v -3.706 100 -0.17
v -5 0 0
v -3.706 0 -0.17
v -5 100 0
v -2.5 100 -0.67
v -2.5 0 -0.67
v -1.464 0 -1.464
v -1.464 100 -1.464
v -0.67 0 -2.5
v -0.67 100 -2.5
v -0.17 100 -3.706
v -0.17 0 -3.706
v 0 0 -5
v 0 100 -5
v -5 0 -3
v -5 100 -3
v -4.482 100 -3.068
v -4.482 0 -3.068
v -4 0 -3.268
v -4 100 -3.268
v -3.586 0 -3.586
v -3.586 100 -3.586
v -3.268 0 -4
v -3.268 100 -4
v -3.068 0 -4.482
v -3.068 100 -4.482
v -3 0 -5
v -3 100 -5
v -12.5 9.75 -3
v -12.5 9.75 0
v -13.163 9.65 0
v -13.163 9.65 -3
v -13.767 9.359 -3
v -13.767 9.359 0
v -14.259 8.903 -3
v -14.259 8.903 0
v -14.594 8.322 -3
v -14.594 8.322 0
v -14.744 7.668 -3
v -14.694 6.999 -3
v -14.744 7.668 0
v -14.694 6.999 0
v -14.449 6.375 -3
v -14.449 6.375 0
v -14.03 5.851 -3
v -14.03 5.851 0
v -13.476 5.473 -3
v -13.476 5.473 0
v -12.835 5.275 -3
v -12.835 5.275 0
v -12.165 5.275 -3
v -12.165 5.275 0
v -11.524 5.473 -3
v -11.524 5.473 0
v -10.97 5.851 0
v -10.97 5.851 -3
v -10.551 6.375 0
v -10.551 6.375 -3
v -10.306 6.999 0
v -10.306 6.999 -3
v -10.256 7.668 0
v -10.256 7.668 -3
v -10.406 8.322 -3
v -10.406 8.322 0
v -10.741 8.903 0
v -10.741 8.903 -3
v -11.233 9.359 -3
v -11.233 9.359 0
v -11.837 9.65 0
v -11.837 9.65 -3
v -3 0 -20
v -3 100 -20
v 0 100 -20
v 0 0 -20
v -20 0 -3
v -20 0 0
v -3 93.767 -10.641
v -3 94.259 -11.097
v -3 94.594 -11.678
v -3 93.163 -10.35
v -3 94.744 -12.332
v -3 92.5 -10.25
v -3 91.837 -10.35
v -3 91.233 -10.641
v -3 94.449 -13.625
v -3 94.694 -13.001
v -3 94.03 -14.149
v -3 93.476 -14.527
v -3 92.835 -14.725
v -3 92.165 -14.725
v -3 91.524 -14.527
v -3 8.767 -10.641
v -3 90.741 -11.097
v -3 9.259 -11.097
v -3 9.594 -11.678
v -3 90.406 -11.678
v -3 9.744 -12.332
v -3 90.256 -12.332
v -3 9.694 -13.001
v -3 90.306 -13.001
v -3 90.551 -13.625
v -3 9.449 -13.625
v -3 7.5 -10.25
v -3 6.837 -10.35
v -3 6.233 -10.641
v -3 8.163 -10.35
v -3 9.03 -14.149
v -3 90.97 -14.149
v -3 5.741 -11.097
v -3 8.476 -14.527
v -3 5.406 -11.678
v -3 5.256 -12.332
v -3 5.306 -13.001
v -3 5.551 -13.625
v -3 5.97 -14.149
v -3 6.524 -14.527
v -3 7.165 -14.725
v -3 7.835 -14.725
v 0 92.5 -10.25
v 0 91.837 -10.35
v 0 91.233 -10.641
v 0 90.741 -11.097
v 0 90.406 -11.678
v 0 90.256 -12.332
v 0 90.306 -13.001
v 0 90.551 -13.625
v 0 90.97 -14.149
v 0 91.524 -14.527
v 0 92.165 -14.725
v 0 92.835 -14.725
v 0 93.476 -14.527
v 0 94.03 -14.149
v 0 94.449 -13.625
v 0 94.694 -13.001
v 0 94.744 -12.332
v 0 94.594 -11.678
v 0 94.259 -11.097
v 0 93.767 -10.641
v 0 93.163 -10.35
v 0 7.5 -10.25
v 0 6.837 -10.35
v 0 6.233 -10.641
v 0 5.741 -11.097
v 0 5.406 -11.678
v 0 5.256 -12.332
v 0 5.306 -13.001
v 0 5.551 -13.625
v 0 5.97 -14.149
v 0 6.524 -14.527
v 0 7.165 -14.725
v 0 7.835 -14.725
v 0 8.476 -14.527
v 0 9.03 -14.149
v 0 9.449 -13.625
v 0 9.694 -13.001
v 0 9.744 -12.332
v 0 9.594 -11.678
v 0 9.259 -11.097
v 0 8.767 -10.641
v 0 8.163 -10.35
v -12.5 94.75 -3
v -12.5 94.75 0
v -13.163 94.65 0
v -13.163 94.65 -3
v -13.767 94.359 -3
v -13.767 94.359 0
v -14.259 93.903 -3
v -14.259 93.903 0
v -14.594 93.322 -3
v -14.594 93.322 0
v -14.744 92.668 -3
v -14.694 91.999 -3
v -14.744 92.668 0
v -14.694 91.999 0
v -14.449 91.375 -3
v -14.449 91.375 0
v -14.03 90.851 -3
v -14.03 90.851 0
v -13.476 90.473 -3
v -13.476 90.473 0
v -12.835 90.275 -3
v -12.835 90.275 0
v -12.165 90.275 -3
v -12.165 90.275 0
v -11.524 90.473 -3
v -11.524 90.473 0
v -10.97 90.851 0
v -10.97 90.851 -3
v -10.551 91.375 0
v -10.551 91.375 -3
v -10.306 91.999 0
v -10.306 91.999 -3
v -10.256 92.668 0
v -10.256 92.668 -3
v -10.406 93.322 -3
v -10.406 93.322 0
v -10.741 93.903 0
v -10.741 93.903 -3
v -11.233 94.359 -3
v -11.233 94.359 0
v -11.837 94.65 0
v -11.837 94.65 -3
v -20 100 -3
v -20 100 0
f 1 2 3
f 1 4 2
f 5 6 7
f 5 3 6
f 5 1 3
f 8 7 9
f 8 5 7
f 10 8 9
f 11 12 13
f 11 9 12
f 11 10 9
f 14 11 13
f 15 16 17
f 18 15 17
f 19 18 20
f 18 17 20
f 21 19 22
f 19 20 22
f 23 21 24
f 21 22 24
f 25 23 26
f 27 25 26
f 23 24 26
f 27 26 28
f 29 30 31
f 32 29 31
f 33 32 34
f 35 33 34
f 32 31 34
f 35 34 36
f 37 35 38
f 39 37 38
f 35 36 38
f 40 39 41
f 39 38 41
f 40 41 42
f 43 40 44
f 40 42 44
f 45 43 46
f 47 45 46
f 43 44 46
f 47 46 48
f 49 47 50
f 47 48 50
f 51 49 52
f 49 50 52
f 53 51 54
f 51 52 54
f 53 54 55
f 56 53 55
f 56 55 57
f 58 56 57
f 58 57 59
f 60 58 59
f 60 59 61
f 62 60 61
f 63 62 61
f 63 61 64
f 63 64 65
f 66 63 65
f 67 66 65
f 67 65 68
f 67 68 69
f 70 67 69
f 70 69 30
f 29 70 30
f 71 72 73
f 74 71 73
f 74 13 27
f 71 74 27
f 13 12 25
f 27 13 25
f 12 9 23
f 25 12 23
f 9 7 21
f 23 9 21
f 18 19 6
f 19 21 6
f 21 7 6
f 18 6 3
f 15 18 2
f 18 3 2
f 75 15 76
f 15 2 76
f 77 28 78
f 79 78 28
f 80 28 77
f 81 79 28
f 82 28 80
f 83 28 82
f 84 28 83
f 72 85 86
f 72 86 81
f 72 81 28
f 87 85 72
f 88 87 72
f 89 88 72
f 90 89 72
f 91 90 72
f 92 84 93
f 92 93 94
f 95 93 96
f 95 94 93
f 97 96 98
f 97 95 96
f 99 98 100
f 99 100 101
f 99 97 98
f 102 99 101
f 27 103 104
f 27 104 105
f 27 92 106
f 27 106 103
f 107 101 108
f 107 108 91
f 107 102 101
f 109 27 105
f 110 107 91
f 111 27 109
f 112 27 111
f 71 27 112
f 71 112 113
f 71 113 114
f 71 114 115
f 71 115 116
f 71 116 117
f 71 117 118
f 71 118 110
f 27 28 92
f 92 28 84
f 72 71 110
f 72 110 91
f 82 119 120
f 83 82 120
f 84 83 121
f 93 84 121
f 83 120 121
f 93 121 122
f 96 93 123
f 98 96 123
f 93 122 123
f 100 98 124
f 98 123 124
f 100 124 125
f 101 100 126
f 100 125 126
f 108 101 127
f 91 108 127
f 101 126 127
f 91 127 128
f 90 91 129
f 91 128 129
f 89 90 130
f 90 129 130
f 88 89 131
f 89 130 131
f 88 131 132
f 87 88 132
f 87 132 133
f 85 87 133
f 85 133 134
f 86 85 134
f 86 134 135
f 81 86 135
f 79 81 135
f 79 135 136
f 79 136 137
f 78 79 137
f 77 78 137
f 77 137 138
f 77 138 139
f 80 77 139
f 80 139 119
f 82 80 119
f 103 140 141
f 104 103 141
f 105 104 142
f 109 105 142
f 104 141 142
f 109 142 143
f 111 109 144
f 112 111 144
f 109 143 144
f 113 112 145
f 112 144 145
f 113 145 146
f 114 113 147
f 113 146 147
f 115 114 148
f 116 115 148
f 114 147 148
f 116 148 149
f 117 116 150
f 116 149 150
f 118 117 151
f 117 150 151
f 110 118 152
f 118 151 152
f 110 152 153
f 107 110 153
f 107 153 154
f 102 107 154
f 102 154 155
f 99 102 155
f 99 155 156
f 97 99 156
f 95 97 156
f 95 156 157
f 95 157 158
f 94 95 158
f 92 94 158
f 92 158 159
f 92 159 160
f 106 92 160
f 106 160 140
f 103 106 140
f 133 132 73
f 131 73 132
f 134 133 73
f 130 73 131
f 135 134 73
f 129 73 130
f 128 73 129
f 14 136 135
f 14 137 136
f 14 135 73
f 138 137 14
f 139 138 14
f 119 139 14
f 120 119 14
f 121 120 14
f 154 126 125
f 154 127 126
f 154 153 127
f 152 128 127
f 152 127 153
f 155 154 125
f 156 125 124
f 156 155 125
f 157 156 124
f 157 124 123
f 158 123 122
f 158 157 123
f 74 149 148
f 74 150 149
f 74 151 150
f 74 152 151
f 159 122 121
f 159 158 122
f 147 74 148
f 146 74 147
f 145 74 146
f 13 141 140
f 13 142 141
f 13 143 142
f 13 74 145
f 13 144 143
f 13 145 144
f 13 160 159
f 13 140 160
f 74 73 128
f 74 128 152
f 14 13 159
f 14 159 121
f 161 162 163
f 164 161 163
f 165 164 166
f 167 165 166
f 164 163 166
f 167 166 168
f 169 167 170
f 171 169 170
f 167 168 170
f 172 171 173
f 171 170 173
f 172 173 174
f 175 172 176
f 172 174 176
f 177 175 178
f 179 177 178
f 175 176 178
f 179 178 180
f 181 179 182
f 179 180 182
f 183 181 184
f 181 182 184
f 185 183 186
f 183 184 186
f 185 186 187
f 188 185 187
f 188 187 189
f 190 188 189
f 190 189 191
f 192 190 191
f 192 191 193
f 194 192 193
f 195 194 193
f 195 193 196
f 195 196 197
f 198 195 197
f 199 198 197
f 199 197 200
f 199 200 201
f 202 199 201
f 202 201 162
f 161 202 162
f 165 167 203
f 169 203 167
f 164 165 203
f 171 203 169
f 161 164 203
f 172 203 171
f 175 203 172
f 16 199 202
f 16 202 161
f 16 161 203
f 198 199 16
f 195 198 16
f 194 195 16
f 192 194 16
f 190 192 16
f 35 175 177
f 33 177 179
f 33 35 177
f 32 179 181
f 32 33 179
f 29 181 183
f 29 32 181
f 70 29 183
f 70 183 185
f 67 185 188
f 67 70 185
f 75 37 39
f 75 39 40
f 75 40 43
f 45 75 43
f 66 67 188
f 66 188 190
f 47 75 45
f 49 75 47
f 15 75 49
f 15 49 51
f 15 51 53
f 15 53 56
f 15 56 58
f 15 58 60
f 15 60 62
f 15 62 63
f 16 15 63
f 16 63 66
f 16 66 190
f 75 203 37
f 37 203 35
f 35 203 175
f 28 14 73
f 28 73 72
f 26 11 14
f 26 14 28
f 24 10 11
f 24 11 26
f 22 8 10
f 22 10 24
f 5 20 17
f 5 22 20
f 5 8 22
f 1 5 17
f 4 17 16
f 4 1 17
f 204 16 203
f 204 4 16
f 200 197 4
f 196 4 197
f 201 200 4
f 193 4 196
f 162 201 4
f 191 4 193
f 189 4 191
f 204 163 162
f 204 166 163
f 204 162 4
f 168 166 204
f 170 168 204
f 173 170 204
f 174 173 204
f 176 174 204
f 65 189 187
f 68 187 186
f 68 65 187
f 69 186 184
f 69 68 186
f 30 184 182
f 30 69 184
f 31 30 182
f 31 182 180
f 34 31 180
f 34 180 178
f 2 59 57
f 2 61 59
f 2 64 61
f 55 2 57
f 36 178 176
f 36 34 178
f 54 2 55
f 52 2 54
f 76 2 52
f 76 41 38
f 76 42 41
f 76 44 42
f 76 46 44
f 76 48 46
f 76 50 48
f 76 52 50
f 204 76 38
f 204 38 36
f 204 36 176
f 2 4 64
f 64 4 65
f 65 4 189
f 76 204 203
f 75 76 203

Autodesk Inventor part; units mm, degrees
ref_plane "YZ Plane" through (0, 0, 0) normal (1, 0, 0) x (0, 1, 0)
ref_plane "XZ Plane" through (0, 0, 0) normal (0, 1, 0) x (-1, 0, 0)
ref_plane "XY Plane" through (0, 0, 0) normal (0, 0, 1) x (1, 0, 0)
sketch "Sketch1" plane through (0, 0, 0) normal (0, 1, 0) x (-1, 0, 0)
  line L0 (0, 0) -> (20, 0)
  line L1 (20, 0) -> (20, -3)
  line L2 (20, -3) -> (0, -3)
  line L3 (0, -3) -> (0, 0)
  line L4 (0, 0) -> (3, 0)
  line L5 (3, 0) -> (3, -20)
  line L6 (3, -20) -> (0, -20)
  line L7 (0, -20) -> (0, 0)
  dimension "d0" = 3
  dimension "d1" = 3
  dimension "d2" = 20
  dimension "d3" = 20
extrude "Extrusion1" add sketch "Sketch1" along normal blind 100
fillet "Fillet1" radius 2 1 edges at (-3, 50, -3)
fillet "Fillet2" radius 5 1 edges at (0, 50, 0)
sketch "Sketch2" plane through (-3, 0, -20) normal (-1, 0, 0) x (0, 0, 1)
  line L0 (0, 100) -> (15, 100) projected
  line L1 (0, 0) -> (15, 0) projected
  line L2 (0, 0) -> (0, 100) projected
  point P0 (20, 0)
  point P1 (7.5, 92.5)
  point P2 (7.5, 7.5)
  dimension "d8" = 7.5
  dimension "d9" = 7.5
  dimension "d10" = 85
  dimension "d11" = 7.5
hole "Hole1" at (-3, 92.5, -12.5) at (-3, 7.5, -12.5) direction (1, 0, 0) diameter 4.5 end through all clearance for "Socket Head Cap Screw" size "M4" standard "Ansi Metric M Profile"
sketch "Sketch3" plane through (-20, 0, -3) normal (0, 0, -1) x (-1, 0, 0)
  line L0 (-15, 100) -> (0, 100) projected
  line L1 (-15, 0) -> (0, 0) projected
  line L2 (0, 0) -> (0, 100) projected
  point P0 (-20, 0)
  point P1 (-7.5, 92.5)
  point P2 (-7.5, 7.5)
  dimension "d19" = 7.5
  dimension "d20" = 7.5
  dimension "d21" = 7.5
hole "Hole2" at (-12.5, 92.5, -3) at (-12.5, 7.5, -3) direction (0, 0, 1) diameter 4.5 end through all clearance for "Socket Head Cap Screw" size "M4" standard "Ansi Metric M Profile"
equation "\"d1\" = d0"
equation "\"d3\" = d2"
equation "\"d9\" = d8"
equation "\"d20\" = d19"
equation "\"d21\" = d19"
properties part number "Pancake_Angle Bracket 2" material "Aluminum 6061"
